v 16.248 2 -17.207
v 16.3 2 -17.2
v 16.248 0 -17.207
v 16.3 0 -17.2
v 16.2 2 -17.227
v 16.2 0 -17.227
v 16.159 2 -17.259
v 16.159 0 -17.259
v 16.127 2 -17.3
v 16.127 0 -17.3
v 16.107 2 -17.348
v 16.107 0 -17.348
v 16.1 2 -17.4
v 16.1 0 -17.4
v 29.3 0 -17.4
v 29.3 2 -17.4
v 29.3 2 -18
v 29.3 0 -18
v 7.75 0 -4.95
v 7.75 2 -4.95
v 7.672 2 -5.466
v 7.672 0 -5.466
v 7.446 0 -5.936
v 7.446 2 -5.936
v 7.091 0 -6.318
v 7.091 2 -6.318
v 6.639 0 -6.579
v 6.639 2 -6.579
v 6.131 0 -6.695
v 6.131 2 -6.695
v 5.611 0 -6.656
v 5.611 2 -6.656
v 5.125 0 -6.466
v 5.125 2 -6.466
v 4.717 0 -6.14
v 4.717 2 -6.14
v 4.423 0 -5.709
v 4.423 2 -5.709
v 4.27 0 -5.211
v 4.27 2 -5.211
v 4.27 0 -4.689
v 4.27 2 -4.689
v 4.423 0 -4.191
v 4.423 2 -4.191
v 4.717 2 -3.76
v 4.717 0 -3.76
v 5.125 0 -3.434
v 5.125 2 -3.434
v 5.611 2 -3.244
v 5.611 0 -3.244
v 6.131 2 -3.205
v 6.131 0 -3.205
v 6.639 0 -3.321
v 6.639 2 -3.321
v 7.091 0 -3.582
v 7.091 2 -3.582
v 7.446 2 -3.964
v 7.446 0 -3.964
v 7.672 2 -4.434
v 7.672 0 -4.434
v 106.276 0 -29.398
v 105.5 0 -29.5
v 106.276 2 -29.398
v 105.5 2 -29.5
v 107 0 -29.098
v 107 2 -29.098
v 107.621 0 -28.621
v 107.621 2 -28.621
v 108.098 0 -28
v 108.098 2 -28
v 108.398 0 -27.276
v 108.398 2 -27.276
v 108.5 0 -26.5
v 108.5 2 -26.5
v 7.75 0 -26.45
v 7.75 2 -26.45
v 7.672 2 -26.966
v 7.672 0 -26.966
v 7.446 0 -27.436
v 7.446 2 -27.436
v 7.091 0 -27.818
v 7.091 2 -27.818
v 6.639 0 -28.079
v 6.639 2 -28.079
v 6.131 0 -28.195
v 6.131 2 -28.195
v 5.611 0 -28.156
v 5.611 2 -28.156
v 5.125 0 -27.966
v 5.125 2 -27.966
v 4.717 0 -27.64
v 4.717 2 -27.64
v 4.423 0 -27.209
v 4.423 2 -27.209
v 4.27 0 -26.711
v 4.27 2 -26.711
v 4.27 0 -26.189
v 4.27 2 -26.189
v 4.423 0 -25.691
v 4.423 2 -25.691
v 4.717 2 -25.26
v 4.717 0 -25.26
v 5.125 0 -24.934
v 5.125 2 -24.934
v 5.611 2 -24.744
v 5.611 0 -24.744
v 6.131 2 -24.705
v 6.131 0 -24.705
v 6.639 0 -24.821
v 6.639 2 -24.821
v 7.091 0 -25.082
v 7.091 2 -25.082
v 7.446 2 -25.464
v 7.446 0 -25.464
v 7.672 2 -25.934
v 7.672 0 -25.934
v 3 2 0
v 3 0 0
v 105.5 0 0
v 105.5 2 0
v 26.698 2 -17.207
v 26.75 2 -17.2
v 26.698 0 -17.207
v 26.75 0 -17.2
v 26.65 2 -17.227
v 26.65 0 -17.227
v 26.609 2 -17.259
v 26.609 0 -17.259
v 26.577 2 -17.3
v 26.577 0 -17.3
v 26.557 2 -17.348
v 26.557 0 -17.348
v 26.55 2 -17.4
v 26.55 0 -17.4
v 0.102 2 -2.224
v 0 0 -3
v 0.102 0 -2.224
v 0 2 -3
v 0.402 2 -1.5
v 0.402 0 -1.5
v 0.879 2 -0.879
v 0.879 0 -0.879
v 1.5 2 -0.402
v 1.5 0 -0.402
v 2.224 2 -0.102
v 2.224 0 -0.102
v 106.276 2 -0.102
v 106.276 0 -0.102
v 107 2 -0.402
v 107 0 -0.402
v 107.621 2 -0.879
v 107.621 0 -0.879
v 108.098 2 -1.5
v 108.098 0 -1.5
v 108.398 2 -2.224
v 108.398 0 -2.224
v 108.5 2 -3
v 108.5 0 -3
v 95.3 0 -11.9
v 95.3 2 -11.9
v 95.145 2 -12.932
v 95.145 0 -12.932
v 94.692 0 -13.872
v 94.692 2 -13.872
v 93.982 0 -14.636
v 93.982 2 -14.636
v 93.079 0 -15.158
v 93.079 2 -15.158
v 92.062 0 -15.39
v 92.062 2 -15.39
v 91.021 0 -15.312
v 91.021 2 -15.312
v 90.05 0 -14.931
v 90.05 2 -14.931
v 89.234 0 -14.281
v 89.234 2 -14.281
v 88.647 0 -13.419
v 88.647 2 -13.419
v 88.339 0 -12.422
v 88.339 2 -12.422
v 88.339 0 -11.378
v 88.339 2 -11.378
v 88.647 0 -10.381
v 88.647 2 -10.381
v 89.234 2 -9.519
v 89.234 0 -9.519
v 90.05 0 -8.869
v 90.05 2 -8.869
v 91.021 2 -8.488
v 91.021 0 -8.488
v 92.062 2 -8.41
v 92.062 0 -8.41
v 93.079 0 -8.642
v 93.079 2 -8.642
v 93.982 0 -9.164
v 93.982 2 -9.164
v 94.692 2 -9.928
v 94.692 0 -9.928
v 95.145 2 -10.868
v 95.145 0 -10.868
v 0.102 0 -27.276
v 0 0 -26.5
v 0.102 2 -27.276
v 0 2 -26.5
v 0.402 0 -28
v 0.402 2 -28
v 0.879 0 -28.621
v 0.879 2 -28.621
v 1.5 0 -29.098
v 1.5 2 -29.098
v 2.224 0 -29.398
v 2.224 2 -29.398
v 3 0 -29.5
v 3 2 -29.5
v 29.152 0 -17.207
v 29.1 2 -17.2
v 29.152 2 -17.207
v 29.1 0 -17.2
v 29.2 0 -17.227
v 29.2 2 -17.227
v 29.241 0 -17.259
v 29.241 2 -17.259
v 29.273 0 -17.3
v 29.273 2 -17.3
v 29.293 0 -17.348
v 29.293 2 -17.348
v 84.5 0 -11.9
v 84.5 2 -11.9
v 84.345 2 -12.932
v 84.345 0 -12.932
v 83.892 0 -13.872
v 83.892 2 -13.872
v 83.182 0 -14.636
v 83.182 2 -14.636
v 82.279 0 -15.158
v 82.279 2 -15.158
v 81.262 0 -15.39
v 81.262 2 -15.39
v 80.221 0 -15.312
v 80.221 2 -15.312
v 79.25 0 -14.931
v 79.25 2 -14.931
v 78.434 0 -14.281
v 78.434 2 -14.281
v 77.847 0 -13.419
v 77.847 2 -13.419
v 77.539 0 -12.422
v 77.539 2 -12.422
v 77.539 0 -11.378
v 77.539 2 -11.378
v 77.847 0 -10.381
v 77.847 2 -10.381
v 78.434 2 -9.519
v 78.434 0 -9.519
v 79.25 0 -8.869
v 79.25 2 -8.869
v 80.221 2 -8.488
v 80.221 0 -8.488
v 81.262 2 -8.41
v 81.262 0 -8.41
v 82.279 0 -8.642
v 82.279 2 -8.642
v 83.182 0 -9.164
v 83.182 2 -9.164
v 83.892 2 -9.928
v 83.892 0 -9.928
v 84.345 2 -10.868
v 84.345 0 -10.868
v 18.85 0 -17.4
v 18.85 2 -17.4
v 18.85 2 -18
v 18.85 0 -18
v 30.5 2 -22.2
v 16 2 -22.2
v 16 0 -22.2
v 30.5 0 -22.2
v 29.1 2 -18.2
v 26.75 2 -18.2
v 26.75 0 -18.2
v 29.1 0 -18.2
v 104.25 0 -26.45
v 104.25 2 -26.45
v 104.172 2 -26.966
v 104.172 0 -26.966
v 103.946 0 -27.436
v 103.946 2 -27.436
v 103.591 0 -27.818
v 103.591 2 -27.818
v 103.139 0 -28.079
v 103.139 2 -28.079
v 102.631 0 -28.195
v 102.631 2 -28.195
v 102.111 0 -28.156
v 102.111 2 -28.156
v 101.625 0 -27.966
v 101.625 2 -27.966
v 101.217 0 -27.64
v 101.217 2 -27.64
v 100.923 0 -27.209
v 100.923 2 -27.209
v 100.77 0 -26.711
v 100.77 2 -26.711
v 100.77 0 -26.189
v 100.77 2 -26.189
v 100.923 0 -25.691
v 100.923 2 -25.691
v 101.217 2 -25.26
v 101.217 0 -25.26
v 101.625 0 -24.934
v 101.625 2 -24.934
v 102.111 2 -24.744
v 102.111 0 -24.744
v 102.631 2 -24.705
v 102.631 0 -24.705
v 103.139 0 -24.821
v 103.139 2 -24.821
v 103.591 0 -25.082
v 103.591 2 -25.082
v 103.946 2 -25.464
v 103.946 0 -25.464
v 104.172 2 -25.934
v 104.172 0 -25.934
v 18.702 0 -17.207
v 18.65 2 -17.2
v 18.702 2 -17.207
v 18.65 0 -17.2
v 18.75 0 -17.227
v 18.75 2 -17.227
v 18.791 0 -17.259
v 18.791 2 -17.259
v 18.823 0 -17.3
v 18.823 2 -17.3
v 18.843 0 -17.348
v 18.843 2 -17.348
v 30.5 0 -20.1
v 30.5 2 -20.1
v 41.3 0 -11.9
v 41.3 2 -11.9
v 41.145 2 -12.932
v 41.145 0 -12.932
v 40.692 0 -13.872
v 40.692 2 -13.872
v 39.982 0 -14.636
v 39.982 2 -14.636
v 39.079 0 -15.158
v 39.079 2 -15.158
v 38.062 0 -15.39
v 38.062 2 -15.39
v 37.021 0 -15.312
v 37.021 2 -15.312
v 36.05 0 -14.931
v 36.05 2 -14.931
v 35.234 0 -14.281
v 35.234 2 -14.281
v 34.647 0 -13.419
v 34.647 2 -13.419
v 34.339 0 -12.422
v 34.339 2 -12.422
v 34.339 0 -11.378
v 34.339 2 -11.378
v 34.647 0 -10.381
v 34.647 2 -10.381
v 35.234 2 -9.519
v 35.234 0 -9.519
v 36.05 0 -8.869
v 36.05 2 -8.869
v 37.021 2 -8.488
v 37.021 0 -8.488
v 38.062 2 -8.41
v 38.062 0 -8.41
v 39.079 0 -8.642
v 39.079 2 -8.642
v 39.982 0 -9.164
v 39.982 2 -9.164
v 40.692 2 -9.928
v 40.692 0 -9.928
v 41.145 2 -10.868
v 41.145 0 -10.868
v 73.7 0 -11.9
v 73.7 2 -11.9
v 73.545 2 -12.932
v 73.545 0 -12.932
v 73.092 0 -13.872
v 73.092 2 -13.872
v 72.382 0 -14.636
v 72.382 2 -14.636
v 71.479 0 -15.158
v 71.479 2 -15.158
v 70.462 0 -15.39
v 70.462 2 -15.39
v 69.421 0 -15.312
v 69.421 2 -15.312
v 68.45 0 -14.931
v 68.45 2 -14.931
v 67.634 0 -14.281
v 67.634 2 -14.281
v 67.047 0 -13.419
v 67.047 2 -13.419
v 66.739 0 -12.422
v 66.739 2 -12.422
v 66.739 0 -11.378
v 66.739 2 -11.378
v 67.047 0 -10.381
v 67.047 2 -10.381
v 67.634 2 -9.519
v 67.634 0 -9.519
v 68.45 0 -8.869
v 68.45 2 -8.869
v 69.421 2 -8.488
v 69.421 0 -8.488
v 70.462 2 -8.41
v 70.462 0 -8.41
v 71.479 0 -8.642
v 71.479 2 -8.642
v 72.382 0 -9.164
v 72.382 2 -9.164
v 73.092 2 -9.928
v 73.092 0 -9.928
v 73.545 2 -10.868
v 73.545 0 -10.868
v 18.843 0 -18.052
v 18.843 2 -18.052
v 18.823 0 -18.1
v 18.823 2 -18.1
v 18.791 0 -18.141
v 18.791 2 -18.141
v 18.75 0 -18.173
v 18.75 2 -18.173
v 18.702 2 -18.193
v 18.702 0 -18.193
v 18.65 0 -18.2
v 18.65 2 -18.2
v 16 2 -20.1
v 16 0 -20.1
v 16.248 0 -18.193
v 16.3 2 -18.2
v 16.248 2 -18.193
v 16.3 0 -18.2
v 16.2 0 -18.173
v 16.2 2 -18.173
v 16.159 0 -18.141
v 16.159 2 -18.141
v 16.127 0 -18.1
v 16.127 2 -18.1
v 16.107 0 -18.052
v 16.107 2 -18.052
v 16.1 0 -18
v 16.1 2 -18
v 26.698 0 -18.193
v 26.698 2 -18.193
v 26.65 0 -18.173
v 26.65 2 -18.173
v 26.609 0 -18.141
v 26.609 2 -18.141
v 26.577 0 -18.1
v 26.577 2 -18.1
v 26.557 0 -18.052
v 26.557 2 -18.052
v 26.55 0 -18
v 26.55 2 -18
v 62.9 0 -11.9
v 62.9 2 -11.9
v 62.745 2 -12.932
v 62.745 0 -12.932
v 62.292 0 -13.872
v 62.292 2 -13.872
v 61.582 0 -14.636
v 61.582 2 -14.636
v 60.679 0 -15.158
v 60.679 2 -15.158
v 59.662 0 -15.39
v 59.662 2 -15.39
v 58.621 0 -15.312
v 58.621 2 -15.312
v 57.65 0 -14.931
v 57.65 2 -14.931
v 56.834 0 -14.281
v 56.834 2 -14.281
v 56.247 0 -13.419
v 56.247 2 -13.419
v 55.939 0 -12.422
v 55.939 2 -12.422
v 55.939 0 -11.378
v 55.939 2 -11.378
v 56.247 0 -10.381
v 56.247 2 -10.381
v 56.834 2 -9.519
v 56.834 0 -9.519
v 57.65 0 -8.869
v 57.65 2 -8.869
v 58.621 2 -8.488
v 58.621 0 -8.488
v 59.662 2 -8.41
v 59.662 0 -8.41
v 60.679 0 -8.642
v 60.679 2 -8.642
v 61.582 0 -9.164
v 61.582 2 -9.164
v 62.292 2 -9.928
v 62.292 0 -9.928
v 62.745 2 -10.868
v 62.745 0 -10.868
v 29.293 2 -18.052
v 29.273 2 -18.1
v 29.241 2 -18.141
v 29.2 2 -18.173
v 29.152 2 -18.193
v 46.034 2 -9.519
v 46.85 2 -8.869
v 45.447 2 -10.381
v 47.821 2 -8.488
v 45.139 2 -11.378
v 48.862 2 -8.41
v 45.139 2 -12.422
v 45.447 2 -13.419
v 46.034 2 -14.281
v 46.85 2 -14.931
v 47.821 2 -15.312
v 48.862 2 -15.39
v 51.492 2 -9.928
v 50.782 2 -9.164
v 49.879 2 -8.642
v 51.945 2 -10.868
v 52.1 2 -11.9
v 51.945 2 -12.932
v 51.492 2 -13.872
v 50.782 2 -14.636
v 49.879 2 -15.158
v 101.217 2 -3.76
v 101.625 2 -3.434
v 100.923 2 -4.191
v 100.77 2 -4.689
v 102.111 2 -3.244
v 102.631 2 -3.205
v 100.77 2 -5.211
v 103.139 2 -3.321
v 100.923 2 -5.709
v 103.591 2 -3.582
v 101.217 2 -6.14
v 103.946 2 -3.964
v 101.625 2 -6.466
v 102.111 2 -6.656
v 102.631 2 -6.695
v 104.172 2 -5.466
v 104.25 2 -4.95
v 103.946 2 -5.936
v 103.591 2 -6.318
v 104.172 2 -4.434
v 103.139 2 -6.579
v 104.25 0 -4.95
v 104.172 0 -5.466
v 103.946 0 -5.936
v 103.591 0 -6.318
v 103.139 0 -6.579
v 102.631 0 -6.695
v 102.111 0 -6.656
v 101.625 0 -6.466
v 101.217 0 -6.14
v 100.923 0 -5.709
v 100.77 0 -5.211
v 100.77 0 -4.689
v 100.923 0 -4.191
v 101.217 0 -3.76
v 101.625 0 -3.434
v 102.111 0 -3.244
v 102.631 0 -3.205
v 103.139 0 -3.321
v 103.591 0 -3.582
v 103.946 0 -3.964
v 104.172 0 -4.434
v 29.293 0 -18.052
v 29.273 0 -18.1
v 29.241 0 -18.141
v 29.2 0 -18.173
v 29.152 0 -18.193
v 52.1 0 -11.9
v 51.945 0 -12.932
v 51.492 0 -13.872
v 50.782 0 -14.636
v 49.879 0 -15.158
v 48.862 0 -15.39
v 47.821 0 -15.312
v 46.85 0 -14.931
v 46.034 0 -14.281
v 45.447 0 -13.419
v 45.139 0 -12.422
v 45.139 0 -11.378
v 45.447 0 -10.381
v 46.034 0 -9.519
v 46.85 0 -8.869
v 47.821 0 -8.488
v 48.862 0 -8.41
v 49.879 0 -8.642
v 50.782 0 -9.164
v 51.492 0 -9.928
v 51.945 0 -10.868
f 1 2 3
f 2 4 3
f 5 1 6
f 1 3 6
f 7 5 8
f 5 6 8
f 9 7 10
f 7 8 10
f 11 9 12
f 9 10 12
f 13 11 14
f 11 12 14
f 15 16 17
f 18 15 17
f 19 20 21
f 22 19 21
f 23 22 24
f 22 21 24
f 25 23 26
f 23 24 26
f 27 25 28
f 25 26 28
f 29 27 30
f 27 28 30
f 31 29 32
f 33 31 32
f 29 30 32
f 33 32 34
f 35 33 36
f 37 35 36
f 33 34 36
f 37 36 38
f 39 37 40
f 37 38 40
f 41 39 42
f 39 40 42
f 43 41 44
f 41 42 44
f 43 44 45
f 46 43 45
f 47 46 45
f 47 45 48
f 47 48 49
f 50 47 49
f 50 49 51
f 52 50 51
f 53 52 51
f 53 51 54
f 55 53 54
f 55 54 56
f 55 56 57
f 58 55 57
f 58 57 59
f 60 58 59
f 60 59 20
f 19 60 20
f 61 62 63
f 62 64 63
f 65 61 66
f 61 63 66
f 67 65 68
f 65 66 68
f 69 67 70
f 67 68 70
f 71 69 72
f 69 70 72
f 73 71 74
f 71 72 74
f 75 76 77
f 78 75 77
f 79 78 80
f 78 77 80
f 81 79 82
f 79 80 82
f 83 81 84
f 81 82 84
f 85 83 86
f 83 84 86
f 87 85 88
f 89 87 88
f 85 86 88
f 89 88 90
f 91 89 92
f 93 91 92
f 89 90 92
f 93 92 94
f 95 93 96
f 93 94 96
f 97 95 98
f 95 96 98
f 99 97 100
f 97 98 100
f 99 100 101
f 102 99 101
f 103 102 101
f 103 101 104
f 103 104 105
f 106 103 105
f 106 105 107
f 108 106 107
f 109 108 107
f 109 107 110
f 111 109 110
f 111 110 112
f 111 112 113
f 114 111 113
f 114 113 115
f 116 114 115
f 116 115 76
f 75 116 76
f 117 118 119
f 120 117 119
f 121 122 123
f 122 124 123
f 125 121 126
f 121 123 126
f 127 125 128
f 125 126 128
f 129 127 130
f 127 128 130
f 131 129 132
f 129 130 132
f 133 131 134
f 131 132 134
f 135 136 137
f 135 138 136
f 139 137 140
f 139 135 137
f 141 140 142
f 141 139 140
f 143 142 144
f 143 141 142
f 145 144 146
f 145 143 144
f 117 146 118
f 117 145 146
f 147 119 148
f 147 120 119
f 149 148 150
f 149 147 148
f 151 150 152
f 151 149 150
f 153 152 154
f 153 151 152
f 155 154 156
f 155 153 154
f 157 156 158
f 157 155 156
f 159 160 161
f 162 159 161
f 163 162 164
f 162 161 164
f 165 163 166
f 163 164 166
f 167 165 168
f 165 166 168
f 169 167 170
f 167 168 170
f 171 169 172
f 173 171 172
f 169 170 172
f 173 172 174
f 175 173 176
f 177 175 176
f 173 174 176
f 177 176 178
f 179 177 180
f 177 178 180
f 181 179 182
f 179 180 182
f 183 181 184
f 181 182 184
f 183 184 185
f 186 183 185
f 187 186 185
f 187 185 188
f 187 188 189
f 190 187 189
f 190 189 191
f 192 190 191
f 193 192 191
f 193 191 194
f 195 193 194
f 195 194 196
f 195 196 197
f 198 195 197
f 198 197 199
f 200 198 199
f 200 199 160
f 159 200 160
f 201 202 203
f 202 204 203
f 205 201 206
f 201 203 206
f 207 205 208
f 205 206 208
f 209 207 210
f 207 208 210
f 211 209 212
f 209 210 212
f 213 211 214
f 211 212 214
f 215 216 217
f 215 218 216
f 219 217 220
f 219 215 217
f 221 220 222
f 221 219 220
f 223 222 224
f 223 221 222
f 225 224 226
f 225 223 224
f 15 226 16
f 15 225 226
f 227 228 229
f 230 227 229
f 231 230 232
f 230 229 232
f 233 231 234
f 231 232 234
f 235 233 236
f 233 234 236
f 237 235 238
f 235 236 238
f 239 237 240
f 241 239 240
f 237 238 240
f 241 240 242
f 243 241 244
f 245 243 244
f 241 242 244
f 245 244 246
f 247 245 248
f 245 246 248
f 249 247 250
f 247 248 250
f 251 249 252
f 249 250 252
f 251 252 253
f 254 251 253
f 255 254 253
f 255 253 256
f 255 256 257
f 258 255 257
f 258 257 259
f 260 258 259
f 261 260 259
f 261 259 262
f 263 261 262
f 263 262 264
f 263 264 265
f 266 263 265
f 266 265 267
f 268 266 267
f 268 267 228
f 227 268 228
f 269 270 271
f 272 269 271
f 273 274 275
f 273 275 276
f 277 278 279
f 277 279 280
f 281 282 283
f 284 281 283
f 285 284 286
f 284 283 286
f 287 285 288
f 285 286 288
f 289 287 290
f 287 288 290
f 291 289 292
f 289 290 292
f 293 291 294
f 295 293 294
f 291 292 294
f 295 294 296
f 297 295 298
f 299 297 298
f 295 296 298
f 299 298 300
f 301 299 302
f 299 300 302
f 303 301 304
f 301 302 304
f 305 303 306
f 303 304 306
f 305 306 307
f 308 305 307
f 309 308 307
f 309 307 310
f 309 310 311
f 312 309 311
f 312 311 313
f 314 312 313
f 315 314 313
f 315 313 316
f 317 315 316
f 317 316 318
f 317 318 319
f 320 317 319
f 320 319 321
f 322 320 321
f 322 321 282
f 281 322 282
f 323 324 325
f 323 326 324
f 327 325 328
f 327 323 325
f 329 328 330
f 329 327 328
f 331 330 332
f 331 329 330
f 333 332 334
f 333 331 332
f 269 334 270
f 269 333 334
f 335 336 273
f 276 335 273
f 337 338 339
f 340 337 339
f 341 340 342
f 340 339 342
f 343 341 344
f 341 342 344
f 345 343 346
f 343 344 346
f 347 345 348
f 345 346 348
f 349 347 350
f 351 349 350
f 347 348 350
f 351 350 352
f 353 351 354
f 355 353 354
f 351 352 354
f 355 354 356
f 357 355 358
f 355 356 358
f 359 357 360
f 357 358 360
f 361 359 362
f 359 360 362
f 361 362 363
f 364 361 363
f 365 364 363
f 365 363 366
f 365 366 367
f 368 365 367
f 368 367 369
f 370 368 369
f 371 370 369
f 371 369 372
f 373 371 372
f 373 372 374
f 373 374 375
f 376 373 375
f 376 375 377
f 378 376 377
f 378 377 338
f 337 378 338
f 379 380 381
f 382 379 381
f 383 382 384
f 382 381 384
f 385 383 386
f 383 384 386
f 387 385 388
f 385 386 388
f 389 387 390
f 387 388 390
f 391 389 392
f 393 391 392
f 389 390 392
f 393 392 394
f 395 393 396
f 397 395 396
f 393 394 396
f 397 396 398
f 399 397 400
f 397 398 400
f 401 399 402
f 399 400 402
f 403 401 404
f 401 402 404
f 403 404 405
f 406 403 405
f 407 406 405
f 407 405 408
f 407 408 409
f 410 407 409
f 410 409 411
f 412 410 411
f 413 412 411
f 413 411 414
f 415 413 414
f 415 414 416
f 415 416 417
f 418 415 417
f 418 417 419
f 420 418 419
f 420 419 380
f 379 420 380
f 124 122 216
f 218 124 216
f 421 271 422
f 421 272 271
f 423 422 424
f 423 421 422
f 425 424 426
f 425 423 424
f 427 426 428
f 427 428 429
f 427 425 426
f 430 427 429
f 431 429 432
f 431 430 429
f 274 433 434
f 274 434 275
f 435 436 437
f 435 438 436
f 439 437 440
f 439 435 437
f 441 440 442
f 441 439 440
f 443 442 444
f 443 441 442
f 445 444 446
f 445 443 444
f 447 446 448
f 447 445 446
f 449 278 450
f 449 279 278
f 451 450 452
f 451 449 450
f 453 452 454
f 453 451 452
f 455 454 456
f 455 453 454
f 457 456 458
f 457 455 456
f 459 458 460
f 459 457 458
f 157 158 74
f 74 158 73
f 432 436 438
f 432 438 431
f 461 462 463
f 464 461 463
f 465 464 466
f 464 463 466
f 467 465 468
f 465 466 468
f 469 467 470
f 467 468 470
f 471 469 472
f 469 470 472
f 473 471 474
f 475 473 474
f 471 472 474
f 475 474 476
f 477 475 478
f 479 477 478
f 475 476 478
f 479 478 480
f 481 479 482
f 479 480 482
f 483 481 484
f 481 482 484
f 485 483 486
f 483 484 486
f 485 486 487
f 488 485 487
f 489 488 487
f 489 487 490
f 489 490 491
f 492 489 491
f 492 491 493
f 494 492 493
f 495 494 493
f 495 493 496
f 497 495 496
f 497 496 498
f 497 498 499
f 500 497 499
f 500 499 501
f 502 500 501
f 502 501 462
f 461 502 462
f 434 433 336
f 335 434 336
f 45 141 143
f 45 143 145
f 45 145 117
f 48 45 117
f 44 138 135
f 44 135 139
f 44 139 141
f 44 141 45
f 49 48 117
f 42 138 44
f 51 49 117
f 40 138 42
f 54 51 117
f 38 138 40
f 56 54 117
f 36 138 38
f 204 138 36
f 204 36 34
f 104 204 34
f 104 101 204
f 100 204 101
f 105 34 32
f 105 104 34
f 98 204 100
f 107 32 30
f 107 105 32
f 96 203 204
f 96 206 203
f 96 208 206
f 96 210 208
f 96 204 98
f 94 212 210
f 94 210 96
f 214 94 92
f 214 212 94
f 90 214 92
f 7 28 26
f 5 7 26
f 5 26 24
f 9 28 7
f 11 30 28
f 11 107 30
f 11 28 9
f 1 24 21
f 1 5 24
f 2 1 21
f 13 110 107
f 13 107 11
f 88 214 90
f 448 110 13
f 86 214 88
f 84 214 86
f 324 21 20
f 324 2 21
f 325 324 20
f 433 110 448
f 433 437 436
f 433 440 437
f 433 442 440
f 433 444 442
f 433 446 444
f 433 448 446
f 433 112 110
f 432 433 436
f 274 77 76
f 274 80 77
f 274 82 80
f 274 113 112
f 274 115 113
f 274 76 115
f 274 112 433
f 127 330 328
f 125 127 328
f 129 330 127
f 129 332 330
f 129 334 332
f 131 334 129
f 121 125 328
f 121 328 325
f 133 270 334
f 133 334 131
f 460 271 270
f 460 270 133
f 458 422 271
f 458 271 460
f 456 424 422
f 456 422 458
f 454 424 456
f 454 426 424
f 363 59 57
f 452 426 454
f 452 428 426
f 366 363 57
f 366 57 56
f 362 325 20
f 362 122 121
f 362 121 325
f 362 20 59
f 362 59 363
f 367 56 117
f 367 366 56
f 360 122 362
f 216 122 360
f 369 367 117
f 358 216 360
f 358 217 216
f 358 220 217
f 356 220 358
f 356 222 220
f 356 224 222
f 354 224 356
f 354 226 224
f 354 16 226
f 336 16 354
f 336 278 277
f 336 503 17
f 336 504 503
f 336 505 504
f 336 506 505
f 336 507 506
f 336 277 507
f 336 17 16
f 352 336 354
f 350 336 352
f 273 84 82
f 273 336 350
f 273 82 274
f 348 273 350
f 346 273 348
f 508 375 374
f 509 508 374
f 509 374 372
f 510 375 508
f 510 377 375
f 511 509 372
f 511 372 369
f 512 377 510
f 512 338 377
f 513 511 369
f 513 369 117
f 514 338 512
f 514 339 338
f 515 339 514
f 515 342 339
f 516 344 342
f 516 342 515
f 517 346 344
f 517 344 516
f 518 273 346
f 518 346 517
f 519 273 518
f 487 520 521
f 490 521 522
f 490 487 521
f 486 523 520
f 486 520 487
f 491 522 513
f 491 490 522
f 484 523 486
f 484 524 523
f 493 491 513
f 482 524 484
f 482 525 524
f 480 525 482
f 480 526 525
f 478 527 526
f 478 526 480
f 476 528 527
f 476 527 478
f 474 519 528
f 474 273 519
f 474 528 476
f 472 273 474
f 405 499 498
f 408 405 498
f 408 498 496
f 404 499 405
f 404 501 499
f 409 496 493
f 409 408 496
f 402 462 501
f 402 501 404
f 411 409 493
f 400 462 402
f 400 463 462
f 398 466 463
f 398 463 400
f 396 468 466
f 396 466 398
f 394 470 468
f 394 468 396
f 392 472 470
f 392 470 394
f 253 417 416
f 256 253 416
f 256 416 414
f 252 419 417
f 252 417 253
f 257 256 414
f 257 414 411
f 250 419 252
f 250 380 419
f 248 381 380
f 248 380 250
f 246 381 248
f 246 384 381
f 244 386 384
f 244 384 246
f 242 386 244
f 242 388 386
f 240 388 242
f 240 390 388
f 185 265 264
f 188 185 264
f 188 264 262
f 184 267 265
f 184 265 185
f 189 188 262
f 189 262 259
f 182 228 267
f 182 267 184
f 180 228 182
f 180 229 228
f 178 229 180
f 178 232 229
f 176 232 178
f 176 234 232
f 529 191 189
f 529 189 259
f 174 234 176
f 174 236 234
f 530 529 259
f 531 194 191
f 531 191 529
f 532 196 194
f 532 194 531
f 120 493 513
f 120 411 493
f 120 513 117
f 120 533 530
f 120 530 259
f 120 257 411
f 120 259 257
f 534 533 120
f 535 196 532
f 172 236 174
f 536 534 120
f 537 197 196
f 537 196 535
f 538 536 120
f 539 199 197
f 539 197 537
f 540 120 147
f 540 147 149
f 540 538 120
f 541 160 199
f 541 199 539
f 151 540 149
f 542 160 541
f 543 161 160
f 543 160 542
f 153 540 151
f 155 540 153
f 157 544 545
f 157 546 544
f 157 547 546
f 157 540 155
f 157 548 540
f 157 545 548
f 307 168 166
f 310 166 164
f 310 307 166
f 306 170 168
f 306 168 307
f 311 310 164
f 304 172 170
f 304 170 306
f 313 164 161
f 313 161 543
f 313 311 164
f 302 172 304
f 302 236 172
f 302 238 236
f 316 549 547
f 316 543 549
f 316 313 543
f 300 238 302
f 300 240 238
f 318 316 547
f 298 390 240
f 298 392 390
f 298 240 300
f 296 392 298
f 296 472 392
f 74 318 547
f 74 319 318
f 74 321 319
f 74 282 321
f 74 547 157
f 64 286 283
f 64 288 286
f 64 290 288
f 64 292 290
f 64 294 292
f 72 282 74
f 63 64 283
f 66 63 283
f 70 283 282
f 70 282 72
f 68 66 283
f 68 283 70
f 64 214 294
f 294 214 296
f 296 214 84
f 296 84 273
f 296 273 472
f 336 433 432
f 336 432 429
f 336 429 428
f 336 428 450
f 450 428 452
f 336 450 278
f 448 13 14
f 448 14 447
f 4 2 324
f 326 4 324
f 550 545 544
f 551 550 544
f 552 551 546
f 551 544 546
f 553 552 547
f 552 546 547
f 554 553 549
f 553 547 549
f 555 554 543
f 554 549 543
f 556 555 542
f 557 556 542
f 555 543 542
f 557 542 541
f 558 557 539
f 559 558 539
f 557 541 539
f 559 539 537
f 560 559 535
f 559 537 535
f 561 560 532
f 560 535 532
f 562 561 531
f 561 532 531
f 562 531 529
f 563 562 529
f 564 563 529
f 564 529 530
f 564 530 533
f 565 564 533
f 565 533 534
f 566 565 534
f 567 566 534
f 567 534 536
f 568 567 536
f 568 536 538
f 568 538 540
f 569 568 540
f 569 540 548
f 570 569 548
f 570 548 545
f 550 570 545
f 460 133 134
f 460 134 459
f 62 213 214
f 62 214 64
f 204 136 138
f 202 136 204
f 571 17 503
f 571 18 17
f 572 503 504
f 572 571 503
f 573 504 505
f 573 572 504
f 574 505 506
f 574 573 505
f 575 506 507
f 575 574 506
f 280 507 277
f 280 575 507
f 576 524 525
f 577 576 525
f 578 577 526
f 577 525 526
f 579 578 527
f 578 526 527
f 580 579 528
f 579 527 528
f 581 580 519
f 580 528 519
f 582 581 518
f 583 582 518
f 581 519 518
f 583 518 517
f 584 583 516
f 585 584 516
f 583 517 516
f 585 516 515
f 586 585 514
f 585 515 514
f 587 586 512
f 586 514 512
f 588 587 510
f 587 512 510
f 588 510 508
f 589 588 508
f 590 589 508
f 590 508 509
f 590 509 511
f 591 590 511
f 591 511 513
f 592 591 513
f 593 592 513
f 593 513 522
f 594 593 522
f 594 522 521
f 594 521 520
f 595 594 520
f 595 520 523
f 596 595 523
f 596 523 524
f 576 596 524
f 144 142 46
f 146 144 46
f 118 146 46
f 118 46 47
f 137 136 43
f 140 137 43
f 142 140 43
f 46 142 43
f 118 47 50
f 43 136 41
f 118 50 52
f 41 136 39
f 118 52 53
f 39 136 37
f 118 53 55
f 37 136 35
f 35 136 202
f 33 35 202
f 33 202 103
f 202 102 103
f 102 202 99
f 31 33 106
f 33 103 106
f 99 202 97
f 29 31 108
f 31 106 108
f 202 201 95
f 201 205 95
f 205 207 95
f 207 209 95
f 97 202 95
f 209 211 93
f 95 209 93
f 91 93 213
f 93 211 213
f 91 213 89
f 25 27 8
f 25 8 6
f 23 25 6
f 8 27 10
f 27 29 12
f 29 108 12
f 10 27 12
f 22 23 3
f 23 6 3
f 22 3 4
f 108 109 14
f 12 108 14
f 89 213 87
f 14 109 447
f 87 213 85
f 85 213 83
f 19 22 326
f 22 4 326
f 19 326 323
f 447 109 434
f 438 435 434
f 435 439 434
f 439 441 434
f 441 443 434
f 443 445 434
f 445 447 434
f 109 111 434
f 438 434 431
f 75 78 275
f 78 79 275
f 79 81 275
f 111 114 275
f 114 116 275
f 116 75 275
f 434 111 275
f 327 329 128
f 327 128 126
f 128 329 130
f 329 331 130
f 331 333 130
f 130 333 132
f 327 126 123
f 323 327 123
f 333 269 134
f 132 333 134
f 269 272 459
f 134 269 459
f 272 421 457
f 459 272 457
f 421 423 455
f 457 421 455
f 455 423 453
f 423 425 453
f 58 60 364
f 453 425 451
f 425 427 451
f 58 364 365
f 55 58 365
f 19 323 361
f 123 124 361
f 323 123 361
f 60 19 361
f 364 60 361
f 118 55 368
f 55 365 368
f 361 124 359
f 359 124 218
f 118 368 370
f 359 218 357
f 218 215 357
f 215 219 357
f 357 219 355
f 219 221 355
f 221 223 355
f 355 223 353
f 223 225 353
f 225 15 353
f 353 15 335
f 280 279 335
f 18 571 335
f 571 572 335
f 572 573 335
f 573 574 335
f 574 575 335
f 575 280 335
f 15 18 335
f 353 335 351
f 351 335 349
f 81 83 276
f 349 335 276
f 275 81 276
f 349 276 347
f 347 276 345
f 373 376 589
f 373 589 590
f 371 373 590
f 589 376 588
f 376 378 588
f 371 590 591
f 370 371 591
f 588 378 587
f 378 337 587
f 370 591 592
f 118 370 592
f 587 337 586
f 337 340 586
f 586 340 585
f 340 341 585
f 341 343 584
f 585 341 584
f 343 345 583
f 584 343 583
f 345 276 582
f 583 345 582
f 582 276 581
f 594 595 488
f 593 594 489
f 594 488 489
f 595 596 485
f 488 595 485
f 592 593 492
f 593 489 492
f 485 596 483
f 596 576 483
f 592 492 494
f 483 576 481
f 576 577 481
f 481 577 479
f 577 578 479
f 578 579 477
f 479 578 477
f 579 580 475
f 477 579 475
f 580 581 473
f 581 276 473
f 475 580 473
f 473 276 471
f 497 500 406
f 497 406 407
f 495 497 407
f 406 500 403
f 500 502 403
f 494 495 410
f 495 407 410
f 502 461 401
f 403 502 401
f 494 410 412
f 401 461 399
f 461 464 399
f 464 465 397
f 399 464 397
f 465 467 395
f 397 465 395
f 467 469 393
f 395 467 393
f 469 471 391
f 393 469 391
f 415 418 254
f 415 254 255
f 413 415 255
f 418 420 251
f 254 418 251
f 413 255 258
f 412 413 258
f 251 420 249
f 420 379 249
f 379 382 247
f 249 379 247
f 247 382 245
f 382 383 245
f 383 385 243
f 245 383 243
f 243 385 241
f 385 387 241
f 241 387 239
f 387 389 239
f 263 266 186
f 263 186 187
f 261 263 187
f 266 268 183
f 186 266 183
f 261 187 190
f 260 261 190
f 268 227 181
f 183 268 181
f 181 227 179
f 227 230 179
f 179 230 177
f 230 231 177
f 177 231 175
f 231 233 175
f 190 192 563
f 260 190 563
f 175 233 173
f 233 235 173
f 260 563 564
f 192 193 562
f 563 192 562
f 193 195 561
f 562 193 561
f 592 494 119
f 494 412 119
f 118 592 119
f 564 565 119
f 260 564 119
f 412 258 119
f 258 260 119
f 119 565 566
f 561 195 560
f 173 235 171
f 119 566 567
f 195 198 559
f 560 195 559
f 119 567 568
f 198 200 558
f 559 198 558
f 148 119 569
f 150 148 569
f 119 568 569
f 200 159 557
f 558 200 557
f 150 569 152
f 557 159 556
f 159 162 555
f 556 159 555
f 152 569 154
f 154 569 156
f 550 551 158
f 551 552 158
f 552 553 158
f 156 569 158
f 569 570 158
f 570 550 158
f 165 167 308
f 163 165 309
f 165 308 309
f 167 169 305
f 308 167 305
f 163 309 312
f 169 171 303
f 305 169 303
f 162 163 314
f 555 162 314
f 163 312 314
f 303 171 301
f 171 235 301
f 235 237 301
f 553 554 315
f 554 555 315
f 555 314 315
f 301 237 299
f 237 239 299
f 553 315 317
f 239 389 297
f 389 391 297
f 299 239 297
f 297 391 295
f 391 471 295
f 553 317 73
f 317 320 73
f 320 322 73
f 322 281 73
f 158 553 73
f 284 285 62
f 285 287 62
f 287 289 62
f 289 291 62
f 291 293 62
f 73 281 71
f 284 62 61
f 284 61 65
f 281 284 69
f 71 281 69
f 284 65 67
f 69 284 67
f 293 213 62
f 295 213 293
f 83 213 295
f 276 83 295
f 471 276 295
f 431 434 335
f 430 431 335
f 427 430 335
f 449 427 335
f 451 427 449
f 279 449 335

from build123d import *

# Parameters (mm, degrees)
SKETCH1_W           = 108.5
SKETCH1_H           = 29.5
BOSS_EXTRUDE1_DEPTH = 2
SKETCH2_R           = 1.75
CUT_EXTRUDE1_DEPTH  = 3
FILLET1_R           = 3
SKETCH5_R           = 3.5
SKETCH5_W           = 14.5
SKETCH5_H           = 2.1
SKETCH5_W_2         = 2.75
SKETCH5_H_2         = 1
CUT_EXTRUDE2_DEPTH  = 3
FILLET2_R           = 0.2


with BuildPart() as part:
    # Sketch1 → Boss-Extrude1 (new body)
    with BuildSketch(Plane(origin=(0, 0, 0), x_dir=(1, 0, 0), z_dir=(0, 1, 0))):
        with Locations((54.25, 14.75)):
            Rectangle(SKETCH1_W, SKETCH1_H)
    extrude(amount=BOSS_EXTRUDE1_DEPTH)

    # Sketch2 → Cut-Extrude1 (cut, through all)
    with BuildSketch(Plane(origin=(0, 2, 0), x_dir=(1, 0, 0), z_dir=(0, 1, 0))):
        with Locations((6, 26.45)):
            Circle(SKETCH2_R)
        with Locations((6, 4.95)):
            Circle(SKETCH2_R)
        with Locations((102.5, 4.95)):
            Circle(SKETCH2_R)
        with Locations((102.5, 26.45)):
            Circle(SKETCH2_R)
    extrude(amount=-CUT_EXTRUDE1_DEPTH, mode=Mode.SUBTRACT)

    # Fillet1
    fillet1_edges = [part.edges().sort_by_distance(p)[0] for p in [
        (0, 1, -29.5),
        (108.5, 1, -29.5),
        (108.5, 1, 0),
        (0, 1, 0),
    ]]
    fillet(fillet1_edges, radius=FILLET1_R)

    # Sketch5 → Cut-Extrude2 (cut, through all)
    with BuildSketch(Plane(origin=(0, 2, 0), x_dir=(1, 0, 0), z_dir=(0, 1, 0))):
        with Locations((91.8, 11.9)):
            Circle(SKETCH5_R)
        with Locations((81, 11.9)):
            Circle(SKETCH5_R)
        with Locations((70.2, 11.9)):
            Circle(SKETCH5_R)
        with Locations((59.4, 11.9)):
            Circle(SKETCH5_R)
        with Locations((48.6, 11.9)):
            Circle(SKETCH5_R)
        with Locations((37.8, 11.9)):
            Circle(SKETCH5_R)
        with Locations((23.25, 21.15)):
            Rectangle(SKETCH5_W, SKETCH5_H)
        with Locations((17.475, 17.7)):
            Rectangle(SKETCH5_W_2, SKETCH5_H_2)
        with Locations((27.925, 17.7)):
            Rectangle(SKETCH5_W_2, SKETCH5_H_2)
    extrude(amount=-CUT_EXTRUDE2_DEPTH, mode=Mode.SUBTRACT)

    # Fillet2
    fillet2_edges = [part.edges().sort_by_distance(p)[0] for p in [
        (26.55, 1, -17.2),
        (26.55, 1, -18.2),
        (29.3, 1, -18.2),
        (29.3, 1, -17.2),
        (18.85, 1, -18.2),
        (18.85, 1, -17.2),
        (16.1, 1, -17.2),
        (16.1, 1, -18.2),
    ]]
    fillet(fillet2_edges, radius=FILLET2_R)


solid = part.part
